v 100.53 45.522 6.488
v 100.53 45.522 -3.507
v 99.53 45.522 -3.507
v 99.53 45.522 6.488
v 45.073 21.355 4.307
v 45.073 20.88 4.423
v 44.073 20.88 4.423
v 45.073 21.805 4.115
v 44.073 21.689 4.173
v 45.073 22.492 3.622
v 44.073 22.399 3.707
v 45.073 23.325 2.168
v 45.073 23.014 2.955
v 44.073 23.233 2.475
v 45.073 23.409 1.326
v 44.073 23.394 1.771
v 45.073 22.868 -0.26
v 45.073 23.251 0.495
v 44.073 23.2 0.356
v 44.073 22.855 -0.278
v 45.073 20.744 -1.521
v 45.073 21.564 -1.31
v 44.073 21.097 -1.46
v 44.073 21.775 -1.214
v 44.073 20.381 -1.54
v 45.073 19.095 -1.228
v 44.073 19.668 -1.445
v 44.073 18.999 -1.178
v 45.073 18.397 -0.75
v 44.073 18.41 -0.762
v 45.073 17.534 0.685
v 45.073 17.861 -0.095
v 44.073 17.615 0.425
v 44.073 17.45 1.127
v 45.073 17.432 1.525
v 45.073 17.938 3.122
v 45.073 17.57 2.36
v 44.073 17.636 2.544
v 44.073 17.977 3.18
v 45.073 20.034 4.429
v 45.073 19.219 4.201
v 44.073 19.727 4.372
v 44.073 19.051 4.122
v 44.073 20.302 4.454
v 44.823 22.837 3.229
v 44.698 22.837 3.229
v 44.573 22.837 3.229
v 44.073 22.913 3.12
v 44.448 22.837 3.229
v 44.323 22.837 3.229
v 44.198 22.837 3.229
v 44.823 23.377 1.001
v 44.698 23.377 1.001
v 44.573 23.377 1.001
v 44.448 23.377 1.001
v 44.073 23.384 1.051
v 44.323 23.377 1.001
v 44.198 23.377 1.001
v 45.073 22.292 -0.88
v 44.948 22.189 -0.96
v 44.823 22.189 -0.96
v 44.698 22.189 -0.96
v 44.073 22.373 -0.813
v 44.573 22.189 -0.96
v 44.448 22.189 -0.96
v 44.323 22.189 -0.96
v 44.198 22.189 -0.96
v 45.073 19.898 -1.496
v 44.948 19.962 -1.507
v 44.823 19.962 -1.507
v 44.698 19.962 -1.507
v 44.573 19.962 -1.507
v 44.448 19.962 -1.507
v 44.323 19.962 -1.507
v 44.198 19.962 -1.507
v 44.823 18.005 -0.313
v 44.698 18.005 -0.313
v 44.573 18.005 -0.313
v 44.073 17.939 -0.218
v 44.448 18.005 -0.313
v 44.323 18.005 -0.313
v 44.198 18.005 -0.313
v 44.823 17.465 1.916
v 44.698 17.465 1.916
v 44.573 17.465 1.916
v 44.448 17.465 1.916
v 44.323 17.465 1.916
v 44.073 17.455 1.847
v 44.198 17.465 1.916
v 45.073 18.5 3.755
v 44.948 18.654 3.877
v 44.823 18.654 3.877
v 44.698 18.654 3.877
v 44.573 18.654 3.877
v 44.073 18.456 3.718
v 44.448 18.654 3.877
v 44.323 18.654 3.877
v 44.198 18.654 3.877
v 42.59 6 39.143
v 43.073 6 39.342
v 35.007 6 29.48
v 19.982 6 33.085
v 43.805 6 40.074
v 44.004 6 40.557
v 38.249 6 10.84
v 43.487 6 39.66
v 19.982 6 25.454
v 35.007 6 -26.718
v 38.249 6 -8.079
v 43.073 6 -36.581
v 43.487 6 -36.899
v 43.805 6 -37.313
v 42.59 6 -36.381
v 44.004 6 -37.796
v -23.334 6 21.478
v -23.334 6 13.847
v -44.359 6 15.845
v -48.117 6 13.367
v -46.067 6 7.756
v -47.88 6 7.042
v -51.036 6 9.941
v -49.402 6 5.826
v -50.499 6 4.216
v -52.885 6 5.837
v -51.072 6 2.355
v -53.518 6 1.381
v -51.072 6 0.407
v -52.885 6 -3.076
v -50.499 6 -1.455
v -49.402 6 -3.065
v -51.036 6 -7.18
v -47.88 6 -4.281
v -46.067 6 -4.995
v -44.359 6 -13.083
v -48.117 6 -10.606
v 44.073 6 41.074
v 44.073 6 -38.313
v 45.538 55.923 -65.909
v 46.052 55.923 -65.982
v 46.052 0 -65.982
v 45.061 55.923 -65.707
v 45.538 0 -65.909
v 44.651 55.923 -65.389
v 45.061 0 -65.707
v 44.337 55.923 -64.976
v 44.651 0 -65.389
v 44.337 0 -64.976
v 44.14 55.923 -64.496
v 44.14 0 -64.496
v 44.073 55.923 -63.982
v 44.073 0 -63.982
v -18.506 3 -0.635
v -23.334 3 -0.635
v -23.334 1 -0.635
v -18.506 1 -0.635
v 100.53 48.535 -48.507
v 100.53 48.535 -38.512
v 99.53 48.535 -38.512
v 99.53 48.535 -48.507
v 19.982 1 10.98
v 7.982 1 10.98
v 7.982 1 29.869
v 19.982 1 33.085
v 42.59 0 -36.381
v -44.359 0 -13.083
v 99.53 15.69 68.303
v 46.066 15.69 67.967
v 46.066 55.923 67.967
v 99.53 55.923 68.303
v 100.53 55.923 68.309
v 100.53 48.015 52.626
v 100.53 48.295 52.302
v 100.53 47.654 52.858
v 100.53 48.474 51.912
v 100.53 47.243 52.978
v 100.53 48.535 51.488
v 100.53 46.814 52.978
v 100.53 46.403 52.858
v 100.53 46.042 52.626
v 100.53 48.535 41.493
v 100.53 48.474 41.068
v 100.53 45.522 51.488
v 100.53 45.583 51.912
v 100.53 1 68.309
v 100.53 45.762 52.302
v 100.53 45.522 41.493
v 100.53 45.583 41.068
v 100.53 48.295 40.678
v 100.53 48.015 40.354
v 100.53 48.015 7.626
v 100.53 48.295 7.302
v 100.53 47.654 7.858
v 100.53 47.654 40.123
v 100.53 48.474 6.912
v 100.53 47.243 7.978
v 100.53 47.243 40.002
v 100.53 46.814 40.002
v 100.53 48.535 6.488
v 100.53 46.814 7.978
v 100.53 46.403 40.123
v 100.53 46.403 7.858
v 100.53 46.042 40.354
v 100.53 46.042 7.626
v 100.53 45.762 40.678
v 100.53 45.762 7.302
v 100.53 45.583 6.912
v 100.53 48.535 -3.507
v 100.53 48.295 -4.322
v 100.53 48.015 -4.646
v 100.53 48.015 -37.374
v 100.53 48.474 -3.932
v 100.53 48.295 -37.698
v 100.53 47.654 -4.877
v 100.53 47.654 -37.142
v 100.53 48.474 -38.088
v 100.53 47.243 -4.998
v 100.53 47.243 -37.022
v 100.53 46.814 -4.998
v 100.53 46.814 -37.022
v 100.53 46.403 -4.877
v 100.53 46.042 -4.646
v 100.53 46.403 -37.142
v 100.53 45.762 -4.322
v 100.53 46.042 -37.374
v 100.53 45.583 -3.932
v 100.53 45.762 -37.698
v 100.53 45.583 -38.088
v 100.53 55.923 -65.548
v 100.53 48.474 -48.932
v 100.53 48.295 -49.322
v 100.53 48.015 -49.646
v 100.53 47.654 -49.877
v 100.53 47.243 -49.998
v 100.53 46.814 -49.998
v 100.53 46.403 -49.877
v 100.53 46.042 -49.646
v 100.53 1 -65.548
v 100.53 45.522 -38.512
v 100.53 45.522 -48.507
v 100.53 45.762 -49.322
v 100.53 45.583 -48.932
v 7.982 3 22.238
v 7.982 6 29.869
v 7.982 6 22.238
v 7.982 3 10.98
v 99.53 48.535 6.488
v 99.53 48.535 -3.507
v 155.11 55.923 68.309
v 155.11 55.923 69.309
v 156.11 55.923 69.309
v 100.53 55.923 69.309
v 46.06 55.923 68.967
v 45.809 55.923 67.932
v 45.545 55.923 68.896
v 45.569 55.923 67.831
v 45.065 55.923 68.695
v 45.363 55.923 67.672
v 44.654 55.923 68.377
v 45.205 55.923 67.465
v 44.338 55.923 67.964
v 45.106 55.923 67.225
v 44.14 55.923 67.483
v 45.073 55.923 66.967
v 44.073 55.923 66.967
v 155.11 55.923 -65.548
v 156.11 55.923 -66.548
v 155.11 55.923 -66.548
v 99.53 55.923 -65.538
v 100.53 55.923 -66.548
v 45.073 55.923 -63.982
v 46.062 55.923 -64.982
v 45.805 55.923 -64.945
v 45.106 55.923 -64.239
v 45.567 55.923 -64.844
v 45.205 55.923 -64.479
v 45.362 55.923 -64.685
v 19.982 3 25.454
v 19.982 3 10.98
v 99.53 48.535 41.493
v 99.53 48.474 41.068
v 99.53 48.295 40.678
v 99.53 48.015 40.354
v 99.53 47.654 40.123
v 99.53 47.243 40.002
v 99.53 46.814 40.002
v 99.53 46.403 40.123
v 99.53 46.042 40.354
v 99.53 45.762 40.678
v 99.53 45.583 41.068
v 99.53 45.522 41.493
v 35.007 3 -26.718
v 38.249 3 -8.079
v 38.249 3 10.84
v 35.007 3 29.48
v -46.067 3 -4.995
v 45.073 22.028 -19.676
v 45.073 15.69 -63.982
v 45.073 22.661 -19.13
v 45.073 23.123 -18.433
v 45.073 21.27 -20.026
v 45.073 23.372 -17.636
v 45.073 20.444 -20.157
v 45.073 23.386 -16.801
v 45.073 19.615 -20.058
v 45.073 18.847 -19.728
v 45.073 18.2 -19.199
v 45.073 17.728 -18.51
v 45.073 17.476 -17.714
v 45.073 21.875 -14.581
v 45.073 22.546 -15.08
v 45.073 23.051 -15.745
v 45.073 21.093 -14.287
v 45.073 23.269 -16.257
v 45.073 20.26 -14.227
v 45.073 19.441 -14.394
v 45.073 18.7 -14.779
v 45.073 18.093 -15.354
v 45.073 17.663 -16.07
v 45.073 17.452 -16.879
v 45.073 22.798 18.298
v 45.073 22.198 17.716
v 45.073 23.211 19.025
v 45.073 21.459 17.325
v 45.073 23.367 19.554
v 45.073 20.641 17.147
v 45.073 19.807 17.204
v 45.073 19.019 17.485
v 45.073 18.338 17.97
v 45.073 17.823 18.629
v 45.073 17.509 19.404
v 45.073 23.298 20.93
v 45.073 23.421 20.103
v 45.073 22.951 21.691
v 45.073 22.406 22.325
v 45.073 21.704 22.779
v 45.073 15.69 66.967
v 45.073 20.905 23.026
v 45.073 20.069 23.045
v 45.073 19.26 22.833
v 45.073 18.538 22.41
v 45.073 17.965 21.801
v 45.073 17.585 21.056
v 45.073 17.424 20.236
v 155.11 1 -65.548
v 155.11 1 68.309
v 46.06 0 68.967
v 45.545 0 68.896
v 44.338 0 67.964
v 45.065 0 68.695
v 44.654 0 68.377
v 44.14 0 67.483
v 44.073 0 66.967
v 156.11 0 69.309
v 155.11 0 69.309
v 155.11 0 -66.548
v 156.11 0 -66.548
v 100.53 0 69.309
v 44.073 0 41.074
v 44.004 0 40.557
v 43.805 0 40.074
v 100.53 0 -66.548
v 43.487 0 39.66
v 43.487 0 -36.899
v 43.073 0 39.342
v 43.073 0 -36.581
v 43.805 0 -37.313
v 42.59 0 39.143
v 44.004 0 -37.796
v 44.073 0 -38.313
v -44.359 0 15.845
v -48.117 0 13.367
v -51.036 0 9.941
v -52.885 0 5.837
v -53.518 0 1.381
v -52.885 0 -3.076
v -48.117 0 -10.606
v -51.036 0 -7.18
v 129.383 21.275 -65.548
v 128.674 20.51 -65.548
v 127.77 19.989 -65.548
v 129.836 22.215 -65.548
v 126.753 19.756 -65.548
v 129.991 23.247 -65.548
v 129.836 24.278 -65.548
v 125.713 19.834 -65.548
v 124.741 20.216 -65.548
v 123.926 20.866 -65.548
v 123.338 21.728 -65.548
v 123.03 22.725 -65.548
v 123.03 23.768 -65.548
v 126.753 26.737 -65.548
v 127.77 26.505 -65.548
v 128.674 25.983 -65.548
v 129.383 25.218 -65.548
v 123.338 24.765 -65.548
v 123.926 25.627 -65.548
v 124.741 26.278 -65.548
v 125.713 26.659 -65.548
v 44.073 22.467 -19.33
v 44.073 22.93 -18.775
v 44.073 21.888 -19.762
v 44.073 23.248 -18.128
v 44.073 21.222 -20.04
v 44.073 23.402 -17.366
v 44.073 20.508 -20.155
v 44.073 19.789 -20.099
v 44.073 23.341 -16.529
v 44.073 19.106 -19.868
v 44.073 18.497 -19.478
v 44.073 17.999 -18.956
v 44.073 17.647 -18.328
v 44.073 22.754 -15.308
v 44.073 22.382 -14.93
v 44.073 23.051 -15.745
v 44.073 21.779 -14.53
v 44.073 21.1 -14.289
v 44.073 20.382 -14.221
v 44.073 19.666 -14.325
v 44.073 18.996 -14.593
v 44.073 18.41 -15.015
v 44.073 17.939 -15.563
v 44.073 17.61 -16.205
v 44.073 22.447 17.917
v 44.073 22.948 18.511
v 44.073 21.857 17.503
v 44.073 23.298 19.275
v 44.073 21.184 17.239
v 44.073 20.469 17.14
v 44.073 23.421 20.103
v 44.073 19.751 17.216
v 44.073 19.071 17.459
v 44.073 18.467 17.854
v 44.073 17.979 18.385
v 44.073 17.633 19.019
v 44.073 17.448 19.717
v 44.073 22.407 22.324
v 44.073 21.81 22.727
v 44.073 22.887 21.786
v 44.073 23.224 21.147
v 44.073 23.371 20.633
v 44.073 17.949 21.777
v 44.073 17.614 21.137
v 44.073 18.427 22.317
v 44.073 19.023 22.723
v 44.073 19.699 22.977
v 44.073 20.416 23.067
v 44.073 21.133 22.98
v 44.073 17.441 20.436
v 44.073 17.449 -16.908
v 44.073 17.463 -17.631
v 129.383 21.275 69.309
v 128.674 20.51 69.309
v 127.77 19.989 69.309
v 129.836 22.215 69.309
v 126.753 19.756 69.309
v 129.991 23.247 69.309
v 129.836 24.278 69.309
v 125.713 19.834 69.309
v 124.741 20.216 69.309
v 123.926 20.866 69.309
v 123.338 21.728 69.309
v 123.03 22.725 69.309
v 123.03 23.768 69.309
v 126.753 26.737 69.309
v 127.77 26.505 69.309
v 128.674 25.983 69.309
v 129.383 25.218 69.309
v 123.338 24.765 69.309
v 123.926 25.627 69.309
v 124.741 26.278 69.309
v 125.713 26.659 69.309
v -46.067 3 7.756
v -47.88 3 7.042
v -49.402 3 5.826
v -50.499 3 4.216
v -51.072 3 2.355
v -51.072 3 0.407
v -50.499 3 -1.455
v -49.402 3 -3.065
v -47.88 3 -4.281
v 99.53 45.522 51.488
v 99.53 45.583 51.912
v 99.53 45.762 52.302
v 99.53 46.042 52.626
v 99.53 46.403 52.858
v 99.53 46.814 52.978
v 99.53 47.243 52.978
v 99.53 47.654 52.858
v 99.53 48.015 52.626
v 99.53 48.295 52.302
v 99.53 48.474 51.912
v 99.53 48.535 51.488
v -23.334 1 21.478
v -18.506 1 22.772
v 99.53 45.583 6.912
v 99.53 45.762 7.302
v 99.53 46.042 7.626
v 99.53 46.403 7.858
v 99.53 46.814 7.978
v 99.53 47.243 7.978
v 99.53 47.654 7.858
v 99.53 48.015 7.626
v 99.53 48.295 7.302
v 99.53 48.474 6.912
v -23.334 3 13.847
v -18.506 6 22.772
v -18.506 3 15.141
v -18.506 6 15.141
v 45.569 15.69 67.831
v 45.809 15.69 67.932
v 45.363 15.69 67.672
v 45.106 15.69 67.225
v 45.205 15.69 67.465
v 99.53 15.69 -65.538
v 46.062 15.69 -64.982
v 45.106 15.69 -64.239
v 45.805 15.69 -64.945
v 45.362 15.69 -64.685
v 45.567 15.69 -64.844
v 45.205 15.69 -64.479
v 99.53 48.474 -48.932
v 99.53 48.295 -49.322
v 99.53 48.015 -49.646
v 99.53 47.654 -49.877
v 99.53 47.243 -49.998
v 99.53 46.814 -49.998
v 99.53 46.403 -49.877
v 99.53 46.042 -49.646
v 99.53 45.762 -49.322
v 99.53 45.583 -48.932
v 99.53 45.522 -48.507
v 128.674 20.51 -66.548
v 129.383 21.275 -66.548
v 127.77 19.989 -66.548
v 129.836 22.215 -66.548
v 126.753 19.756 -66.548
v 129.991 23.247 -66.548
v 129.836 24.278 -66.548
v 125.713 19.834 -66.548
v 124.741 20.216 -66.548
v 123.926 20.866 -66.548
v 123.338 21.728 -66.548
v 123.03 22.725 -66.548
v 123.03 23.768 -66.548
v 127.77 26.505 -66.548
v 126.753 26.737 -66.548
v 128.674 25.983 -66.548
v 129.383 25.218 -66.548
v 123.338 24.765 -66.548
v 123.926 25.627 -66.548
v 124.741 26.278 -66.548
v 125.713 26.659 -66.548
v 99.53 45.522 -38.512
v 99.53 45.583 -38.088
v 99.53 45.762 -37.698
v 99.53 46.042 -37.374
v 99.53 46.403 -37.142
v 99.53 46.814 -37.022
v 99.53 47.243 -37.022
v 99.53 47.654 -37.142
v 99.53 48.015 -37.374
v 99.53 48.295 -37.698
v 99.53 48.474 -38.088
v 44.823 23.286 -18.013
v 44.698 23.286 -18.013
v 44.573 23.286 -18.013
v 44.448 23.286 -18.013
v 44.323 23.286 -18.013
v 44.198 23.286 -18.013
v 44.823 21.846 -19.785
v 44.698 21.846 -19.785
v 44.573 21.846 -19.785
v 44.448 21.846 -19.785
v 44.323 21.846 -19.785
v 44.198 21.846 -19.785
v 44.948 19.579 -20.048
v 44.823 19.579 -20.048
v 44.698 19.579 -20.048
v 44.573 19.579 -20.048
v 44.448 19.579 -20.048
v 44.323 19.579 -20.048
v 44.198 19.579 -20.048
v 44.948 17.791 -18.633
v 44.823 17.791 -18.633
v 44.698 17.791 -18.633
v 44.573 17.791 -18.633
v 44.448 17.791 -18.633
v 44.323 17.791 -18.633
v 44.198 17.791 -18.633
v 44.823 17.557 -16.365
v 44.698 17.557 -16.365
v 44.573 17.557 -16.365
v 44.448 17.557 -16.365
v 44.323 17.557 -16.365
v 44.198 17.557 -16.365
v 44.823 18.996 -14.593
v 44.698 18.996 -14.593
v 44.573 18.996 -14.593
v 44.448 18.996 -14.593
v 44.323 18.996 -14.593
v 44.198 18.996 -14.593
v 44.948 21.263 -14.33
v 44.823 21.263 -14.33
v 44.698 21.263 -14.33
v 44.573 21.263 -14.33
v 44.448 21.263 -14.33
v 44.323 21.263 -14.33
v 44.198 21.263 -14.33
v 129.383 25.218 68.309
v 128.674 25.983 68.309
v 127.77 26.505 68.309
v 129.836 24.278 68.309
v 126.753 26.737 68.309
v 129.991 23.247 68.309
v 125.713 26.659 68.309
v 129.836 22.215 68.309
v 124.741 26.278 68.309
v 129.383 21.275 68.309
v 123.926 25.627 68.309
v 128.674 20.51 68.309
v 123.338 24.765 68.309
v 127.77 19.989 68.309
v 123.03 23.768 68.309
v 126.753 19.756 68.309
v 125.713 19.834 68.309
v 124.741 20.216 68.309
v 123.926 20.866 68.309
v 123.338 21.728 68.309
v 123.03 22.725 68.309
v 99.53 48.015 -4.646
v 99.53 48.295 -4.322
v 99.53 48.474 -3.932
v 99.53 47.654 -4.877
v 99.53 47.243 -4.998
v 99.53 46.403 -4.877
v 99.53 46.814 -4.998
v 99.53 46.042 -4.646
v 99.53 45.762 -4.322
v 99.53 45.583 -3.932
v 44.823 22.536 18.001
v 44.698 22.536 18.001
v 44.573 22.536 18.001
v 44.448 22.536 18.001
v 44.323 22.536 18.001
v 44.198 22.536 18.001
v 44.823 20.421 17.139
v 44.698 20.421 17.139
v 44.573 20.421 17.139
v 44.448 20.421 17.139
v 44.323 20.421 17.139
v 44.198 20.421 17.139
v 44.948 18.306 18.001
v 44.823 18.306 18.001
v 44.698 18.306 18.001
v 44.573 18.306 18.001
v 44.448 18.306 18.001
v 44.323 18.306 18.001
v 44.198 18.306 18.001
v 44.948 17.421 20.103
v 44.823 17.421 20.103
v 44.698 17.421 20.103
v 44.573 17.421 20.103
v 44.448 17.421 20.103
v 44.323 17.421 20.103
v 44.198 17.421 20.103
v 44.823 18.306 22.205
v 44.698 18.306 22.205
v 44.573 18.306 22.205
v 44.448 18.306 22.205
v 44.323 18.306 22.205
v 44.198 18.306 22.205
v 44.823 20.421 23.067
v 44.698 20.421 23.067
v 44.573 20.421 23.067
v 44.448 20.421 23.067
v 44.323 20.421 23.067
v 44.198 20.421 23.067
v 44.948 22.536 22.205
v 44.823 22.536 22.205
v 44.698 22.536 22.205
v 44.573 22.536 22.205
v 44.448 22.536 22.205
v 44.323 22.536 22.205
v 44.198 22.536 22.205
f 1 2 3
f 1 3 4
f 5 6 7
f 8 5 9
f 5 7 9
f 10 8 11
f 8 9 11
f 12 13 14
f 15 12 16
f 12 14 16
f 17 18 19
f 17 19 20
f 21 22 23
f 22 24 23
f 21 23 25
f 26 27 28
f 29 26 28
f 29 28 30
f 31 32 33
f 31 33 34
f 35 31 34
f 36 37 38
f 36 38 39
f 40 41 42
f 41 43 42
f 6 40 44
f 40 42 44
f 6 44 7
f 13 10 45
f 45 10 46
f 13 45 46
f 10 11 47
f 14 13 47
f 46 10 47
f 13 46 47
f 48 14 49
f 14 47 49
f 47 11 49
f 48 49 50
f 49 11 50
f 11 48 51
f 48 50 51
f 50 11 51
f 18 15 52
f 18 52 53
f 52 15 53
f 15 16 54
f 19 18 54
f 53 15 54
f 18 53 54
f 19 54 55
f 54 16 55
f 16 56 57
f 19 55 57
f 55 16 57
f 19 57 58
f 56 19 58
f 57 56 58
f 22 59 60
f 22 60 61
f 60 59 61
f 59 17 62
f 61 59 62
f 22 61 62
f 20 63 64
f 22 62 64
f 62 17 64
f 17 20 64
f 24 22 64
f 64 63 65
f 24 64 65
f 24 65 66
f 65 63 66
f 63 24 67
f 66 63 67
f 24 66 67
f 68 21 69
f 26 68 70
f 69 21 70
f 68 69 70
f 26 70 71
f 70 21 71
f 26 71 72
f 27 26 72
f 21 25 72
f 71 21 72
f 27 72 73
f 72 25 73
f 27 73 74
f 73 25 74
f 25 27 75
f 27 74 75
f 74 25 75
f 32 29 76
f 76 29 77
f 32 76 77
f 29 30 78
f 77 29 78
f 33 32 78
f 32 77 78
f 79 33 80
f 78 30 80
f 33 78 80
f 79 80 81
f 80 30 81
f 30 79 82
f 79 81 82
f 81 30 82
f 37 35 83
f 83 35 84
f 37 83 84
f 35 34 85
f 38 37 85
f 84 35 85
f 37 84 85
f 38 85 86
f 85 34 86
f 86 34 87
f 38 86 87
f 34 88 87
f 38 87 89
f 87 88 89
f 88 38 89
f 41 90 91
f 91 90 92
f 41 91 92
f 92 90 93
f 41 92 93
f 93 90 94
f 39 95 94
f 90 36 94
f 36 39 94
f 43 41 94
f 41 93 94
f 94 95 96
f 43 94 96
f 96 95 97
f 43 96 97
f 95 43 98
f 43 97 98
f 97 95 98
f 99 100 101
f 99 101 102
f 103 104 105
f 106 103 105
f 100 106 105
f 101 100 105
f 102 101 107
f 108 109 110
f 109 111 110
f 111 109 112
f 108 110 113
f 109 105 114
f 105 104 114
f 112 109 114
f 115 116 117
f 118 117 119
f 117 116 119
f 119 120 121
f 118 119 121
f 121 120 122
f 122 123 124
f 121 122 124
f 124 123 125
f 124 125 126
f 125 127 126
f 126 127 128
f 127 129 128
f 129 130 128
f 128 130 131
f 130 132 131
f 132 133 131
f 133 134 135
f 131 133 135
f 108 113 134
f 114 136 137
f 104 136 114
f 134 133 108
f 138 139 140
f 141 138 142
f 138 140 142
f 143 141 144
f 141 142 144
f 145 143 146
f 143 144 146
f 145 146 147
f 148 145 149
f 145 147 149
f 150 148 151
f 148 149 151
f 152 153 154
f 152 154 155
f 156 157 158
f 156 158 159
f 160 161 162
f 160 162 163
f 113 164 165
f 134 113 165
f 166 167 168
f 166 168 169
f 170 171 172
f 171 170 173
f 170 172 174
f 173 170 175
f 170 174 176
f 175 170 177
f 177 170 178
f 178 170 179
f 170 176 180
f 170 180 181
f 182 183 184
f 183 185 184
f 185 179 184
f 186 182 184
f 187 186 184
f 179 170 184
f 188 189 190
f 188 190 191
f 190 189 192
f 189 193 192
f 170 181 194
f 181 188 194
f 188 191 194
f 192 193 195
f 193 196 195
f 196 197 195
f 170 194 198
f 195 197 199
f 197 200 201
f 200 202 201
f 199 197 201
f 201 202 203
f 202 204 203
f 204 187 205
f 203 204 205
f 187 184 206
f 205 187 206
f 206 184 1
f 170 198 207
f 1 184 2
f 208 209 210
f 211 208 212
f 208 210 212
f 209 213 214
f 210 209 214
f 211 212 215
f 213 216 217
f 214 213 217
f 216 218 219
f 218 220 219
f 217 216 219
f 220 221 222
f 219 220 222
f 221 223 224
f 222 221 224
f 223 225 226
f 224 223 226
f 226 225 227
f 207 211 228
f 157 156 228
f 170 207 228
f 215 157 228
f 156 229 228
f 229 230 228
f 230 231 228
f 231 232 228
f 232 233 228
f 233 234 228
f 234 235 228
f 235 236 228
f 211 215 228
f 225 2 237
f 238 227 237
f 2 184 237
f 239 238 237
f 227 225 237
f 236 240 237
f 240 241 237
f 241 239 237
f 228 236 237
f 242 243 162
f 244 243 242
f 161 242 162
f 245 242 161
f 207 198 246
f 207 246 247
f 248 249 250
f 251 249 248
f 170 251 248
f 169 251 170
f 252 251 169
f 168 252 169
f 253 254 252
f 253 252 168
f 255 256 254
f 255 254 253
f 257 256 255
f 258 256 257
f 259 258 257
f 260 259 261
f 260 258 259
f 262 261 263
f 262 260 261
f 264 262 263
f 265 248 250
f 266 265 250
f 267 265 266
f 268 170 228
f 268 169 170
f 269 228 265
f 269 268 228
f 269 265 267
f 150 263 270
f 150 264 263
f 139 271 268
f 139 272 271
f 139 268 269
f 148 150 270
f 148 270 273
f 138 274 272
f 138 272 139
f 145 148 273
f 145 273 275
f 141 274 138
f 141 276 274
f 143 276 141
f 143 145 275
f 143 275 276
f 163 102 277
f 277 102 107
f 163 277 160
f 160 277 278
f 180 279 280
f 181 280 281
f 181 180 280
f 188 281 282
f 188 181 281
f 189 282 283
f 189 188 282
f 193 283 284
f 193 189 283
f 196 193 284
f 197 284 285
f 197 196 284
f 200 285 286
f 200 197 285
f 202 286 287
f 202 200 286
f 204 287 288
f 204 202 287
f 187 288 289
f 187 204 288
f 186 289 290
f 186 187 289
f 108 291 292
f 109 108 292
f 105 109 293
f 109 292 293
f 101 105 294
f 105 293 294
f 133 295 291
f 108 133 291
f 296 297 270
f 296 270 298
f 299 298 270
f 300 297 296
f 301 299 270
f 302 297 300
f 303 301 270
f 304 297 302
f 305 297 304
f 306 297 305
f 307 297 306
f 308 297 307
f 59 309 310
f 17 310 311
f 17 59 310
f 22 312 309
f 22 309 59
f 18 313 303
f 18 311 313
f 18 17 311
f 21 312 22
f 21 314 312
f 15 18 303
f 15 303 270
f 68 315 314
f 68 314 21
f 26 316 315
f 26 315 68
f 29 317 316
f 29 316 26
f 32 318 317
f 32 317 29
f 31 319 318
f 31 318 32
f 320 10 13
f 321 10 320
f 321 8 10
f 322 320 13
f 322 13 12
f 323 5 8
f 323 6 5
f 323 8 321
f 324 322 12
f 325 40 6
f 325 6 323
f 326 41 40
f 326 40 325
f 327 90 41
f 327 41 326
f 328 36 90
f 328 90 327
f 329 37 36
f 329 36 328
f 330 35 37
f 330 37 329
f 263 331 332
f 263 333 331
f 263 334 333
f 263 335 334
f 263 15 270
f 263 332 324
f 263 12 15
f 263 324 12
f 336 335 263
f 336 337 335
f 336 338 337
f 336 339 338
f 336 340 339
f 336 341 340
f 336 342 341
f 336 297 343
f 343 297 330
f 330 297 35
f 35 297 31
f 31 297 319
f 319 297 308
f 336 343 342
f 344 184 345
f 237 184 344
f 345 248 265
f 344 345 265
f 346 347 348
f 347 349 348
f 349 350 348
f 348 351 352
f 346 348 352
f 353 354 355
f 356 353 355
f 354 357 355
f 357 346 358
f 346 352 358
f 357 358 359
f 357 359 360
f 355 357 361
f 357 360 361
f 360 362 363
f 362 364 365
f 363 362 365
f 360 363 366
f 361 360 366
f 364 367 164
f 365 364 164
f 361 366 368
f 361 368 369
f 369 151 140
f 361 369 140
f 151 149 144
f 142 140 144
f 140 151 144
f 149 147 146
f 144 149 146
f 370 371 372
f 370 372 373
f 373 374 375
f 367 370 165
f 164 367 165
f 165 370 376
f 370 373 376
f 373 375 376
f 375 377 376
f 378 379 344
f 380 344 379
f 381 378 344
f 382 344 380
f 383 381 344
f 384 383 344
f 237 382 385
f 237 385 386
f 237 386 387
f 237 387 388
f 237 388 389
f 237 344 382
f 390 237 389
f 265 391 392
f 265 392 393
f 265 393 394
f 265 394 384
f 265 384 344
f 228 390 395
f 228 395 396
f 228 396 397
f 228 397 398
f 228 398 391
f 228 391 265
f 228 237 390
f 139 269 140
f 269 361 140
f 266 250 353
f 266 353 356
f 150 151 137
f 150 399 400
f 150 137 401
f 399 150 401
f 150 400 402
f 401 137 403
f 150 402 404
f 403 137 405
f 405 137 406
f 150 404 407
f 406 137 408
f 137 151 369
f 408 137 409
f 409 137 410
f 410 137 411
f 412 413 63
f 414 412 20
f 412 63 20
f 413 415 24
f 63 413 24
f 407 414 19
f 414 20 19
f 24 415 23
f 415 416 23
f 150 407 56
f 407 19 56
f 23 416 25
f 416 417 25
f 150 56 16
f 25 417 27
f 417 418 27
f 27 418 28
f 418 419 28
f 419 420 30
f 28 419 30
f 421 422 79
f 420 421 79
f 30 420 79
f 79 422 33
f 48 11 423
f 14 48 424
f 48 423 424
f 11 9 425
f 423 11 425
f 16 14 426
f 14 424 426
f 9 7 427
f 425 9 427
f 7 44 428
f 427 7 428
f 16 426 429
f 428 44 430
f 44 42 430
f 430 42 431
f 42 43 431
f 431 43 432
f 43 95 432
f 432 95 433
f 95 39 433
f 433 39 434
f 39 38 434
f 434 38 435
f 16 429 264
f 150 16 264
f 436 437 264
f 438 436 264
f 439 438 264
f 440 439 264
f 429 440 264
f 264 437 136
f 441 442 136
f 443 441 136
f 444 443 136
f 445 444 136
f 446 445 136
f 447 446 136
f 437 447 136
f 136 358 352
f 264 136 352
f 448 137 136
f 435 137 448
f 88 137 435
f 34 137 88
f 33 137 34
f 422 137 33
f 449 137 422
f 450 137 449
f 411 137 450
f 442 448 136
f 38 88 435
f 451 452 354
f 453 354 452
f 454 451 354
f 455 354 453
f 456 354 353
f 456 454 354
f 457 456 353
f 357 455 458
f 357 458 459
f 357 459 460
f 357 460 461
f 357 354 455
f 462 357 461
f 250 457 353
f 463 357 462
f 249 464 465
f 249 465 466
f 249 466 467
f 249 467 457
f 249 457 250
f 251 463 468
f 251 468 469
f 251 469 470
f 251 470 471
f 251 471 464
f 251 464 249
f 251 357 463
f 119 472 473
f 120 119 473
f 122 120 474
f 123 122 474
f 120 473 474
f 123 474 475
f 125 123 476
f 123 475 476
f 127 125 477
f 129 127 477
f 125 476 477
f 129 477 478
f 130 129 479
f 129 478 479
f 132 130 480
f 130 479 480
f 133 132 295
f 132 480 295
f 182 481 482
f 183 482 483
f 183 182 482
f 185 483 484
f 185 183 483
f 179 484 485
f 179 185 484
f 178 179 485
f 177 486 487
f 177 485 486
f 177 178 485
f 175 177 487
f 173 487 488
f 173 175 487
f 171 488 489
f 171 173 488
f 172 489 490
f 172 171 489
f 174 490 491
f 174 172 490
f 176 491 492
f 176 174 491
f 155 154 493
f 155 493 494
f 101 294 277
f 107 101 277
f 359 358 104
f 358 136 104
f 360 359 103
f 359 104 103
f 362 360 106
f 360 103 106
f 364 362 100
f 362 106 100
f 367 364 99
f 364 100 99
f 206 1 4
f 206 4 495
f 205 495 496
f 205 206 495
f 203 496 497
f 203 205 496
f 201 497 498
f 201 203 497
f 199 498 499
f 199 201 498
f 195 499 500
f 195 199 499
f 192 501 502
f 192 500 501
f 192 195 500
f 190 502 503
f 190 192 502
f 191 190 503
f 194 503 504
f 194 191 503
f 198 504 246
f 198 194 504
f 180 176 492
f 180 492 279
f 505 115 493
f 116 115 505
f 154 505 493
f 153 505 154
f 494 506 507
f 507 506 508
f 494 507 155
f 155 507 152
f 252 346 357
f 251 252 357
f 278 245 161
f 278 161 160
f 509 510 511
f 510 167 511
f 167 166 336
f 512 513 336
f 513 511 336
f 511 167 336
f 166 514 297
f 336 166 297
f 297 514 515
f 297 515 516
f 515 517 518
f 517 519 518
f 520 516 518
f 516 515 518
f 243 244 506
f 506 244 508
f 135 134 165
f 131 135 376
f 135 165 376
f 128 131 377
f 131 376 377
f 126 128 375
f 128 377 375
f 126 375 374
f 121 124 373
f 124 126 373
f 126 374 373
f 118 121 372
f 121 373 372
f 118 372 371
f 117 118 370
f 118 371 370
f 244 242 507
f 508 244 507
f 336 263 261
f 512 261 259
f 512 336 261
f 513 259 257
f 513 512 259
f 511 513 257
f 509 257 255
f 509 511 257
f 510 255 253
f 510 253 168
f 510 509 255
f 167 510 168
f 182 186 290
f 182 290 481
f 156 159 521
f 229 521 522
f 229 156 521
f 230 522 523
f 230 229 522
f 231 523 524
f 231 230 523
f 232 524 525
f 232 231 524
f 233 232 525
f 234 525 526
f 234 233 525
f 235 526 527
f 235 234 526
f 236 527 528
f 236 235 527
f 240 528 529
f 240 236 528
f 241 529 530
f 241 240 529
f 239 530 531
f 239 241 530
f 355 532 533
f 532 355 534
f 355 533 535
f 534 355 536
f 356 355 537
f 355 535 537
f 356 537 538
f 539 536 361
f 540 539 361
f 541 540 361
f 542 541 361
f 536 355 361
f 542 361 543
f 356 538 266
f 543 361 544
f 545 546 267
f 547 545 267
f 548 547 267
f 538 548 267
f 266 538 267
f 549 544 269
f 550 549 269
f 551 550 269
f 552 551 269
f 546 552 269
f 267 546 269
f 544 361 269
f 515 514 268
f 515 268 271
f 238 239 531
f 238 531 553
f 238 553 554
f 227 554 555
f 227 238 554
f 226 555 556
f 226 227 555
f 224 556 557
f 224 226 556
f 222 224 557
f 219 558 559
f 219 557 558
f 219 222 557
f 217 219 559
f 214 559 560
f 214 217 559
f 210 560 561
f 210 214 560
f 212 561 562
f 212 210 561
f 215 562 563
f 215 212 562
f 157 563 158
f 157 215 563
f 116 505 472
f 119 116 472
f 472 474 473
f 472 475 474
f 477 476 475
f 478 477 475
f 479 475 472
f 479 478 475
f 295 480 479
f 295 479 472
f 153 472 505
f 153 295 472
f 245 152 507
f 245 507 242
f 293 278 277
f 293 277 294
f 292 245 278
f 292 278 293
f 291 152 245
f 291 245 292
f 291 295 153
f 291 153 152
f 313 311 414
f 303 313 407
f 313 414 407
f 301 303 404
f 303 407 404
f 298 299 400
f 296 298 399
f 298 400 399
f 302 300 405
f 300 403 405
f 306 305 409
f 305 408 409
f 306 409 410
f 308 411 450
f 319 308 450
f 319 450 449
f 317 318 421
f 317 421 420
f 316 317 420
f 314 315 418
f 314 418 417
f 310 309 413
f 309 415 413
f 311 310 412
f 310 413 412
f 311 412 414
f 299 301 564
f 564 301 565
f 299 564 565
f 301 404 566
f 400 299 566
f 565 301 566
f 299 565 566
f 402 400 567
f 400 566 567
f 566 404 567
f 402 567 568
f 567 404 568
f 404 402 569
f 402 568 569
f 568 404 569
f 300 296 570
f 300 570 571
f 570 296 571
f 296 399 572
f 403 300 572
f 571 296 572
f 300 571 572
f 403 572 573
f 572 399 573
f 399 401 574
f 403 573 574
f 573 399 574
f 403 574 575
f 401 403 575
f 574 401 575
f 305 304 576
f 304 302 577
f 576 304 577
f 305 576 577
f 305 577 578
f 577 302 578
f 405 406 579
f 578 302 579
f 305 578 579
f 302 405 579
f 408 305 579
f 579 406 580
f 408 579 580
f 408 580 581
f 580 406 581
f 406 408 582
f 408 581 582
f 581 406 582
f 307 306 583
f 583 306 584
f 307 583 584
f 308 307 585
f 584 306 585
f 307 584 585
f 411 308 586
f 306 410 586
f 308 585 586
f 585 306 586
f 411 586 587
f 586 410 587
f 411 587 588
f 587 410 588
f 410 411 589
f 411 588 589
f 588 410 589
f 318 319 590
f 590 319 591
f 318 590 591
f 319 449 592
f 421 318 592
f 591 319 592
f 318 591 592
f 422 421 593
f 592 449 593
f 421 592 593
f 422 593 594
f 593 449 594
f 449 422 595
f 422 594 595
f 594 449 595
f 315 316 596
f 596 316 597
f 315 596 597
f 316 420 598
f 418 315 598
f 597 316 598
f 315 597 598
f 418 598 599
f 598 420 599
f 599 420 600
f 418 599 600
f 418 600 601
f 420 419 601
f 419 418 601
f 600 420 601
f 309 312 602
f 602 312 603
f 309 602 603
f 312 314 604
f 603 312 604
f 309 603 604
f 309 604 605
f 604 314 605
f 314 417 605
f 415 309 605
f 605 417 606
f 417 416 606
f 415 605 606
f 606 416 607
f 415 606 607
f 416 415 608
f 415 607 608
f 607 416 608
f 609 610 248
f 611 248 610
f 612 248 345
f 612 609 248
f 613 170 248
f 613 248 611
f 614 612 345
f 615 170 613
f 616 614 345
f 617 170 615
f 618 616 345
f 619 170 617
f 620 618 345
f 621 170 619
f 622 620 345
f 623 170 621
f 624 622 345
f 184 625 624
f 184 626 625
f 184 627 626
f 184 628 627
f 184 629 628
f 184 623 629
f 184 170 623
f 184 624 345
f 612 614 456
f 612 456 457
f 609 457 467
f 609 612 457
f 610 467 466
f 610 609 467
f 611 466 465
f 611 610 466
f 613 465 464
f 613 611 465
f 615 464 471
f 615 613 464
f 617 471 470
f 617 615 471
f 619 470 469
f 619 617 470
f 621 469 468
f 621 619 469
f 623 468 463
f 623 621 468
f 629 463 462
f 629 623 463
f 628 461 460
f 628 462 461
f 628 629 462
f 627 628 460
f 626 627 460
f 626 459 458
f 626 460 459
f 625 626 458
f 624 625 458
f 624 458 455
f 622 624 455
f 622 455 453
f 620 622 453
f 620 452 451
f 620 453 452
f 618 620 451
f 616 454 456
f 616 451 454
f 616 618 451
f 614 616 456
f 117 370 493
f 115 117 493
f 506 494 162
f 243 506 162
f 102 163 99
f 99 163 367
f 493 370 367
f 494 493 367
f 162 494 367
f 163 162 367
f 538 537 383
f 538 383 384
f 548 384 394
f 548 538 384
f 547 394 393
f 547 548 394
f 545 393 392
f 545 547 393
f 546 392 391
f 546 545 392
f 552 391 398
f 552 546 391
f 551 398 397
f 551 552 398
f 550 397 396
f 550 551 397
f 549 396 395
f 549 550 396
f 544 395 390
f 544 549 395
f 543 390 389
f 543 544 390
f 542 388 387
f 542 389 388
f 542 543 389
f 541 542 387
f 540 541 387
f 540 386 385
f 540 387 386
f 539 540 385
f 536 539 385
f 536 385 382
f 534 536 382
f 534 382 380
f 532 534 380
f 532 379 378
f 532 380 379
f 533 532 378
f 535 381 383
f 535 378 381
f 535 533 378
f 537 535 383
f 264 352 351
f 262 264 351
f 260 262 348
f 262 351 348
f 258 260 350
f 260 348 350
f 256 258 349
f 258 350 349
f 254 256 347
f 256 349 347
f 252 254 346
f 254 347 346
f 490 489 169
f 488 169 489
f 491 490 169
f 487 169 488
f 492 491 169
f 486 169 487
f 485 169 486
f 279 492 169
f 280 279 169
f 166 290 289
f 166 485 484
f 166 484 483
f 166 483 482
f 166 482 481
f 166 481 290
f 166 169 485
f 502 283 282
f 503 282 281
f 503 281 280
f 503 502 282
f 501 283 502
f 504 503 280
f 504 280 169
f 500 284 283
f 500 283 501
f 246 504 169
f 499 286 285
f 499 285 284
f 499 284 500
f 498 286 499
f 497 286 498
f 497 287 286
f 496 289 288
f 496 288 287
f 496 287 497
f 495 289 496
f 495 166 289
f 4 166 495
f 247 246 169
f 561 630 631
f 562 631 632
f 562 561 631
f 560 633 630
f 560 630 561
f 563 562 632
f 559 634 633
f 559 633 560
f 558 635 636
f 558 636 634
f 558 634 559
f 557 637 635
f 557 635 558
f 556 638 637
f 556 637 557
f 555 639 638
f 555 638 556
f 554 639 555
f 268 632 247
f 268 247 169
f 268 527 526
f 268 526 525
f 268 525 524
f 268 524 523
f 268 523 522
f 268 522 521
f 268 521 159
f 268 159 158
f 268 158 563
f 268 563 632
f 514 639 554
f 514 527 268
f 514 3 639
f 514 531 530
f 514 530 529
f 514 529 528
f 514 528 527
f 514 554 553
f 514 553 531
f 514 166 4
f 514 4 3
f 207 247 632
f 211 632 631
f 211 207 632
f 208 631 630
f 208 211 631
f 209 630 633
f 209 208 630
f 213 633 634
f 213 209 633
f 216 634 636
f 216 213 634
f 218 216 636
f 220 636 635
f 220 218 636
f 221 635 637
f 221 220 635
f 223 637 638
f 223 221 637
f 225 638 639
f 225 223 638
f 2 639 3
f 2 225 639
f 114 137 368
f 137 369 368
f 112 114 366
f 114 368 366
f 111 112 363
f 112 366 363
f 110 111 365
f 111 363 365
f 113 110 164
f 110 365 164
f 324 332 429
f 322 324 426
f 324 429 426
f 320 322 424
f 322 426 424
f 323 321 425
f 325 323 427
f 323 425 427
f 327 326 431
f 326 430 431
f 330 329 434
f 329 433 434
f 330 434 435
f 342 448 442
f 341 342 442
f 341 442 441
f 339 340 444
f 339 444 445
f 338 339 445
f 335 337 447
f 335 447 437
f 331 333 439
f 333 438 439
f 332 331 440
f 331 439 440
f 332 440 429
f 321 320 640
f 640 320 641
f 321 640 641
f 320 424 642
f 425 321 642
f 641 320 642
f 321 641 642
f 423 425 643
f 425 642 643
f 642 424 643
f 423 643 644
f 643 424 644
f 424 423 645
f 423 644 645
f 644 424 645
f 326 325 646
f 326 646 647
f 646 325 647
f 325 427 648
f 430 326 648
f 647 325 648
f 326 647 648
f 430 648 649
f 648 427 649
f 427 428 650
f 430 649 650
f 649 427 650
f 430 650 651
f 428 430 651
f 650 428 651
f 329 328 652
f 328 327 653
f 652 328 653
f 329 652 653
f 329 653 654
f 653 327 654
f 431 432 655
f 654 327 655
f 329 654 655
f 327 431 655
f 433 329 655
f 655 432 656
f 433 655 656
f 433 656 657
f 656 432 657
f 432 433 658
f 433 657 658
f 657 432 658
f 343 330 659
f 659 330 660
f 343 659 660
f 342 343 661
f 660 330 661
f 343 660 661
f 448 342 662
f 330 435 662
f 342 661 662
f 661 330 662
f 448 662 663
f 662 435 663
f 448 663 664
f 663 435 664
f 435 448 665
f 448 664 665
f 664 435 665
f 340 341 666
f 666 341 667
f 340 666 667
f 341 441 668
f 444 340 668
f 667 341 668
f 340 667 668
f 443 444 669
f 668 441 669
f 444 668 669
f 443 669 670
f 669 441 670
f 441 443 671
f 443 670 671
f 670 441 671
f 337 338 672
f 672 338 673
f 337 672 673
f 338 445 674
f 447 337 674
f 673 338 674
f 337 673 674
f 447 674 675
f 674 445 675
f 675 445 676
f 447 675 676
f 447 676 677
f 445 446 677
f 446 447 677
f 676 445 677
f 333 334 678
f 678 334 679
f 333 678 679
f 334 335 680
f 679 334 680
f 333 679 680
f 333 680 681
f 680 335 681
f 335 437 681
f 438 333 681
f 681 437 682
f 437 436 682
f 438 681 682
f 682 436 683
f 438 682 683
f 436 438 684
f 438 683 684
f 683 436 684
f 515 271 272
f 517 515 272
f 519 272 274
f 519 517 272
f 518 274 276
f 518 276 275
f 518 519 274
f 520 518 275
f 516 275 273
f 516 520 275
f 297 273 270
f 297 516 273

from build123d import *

# Parameters (mm, degrees)
BOSS_EXTRUDE1_DEPTH      = 3
BOSS_EXTRUDE2_DEPTH      = 6
BOSS_EXTRUDE3_DEPTH      = 9.69
BOSS_EXTRUDE3_DEPTH_BACK = 6
FILLET1_R                = 2
FILLET2_R                = 2
BOSS_EXTRUDE4_DEPTH      = 40.233333333
CUT_EXTRUDE1_DEPTH       = 1.5
CUT_EXTRUDE2_DEPTH       = 1.5
BOSS_EXTRUDE5_DEPTH      = 54.58
CUT_EXTRUDE3_DEPTH       = 214.009386465
CUT_EXTRUDE3_DEPTH_BACK  = 214.009386465
SKETCH10_R               = 3.5
SKETCH12_W               = 12
SKETCH12_H               = 30.726270376
SKETCH12_W_2             = 4.828508562
SKETCH12_H_2             = 30.231621193
CUT_EXTRUDE4_DEPTH       = 5
SKETCH13_W               = 135.857143104
SKETCH13_H               = 55.923333333
BOSS_EXTRUDE6_DEPTH      = 1


with BuildPart() as part:
    # Sketch2 → Boss-Extrude1 (new body)
    with BuildSketch(Plane(origin=(0, 0, 0), x_dir=(1, 0, 0), z_dir=(0, 1, 0))):
        with BuildLine():
            Line((-44.358814779, -15.844661539), (100.530059165, -54.667518304))
            Line((100.530059165, -54.667518304), (100.530059165, 51.906312945))
            Line((100.530059165, 51.906312945), (-44.358814779, 13.083456179))
            ThreePointArc((-44.358814779, 13.083456179), (-53.518419956, -1.38060268), (-44.358814779, -15.844661539))
        make_face()
    extrude(amount=BOSS_EXTRUDE1_DEPTH)

    # Sketch2<3> → Boss-Extrude2 (add)
    with BuildSketch(Plane(origin=(0, 0, 0), x_dir=(1, 0, 0), z_dir=(0, 1, 0))):
        with BuildLine():
            Line((-44.358814779, 13.083456179), (100.530059165, 51.906312945))
            Line((100.530059165, 51.906312945), (100.530059165, -54.667518304))
            Line((100.530059165, -54.667518304), (-44.358814779, -15.844661539))
            ThreePointArc((-44.358814779, -15.844661539), (-53.518419956, -1.38060268), (-44.358814779, 13.083456179))
        make_face()
        with BuildLine():
            Line((-46.067020476, 4.994507774), (35.007341865, 26.71831769))
            ThreePointArc((35.007341865, 26.71831769), (38.656739262, -1.38060268), (35.007341865, -29.479523049))
            Line((35.007341865, -29.479523049), (-46.067020476, -7.755713133))
            ThreePointArc((-46.067020476, -7.755713133), (-51.145215007, -1.38060268), (-46.067020476, 4.994507774))
        make_face(mode=Mode.SUBTRACT)
    extrude(amount=BOSS_EXTRUDE2_DEPTH)

    # Sketch3 → Boss-Extrude3 (add, two sides: drawn at the far end of the back side and taken through both)
    with BuildSketch(Plane(origin=(0, 6, 0), x_dir=(1, 0, 0), z_dir=(0, 1, 0)).offset(-BOSS_EXTRUDE3_DEPTH_BACK)):
        with BuildLine():
            Line((44.072517202, -66.967163029), (44.072517202, -39.539765529))
            Line((44.072517202, -39.539765529), (44.072517202, 36.778560169))
            Line((44.072517202, 36.778560169), (44.072517202, 63.981792798))
            ThreePointArc((44.072517202, 63.981792798), (44.650972897, 65.388637419), (46.051728991, 65.981684758))
            Line((46.051728991, 65.981684758), (100.530059165, 66.547968872))
            Line((100.530059165, 66.547968872), (100.530059165, 51.906312945))
            Line((100.530059165, 51.906312945), (100.530059165, -54.667518304))
            Line((100.530059165, -54.667518304), (100.530059165, -69.309174232))
            Line((100.530059165, -69.309174232), (46.059958243, -68.967123596))
            ThreePointArc((46.059958243, -68.967123596), (44.653870326, -68.376929336), (44.072517202, -66.967163029))
        make_face()
    extrude(amount=BOSS_EXTRUDE3_DEPTH + BOSS_EXTRUDE3_DEPTH_BACK)

    # Fillet1
    fillet1_edges = [part.edges().sort_by_distance(p)[0] for p in [
        (44.072517202, 3, 39.539765529),
    ]]
    fillet(fillet1_edges, radius=FILLET1_R)

    # Fillet2
    fillet2_edges = [part.edges().sort_by_distance(p)[0] for p in [
        (44.072517202, 3, -36.778560169),
    ]]
    fillet(fillet2_edges, radius=FILLET2_R)

    # Sketch5 → Boss-Extrude4 (add)
    with BuildSketch(Plane(origin=(0, 15.69, 0), x_dir=(1, 0, 0), z_dir=(0, 1, 0))):
        with BuildLine():
            Line((46.059958243, -68.967123596), (100.530059165, -69.309174232))
            Line((100.530059165, -69.309174232), (100.530059165, 66.547968872))
            Line((100.530059165, 66.547968872), (46.051728991, 65.981684758))
            ThreePointArc((46.051728991, 65.981684758), (44.650972897, 65.388637419), (44.072517202, 63.981792798))
            Line((44.072517202, 63.981792798), (44.072517202, -66.967163029))
            ThreePointArc((44.072517202, -66.967163029), (44.653870326, -68.376929336), (46.059958243, -68.967123596))
        make_face()
        with BuildLine():
            Line((99.530059165, -68.302874912), (99.530059165, 65.537520182))
            Line((99.530059165, 65.537520182), (46.062123097, 64.981738778))
            ThreePointArc((46.062123097, 64.981738778), (45.36174505, 64.685215109), (45.072517202, 63.981792798))
            Line((45.072517202, 63.981792798), (45.072517202, -66.967163029))
            ThreePointArc((45.072517202, -66.967163029), (45.363193764, -67.672046182), (46.066237723, -67.967143312))
            Line((46.066237723, -67.967143312), (99.530059165, -68.302874912))
        make_face(mode=Mode.SUBTRACT)
    extrude(amount=BOSS_EXTRUDE4_DEPTH)

    # Sketch6 → Cut-Extrude1 (cut)
    with BuildSketch(Plane.ZY.offset(-44.072517202)):
        with BuildLine():
            add(Edge.make_bspline(
                [(-15.745078449, 23.050825441), (-16.426574269, 23.424993836), (-18.107694271, 23.59390395), (-20.06054673, 21.997763181), (-20.359072413, 19.493331011), (-18.791777494, 17.501685815), (-16.270097491, 17.248320643), (-14.317245033, 18.844461412), (-14.018719349, 21.348893583), (-15.063582628, 22.676657046), (-15.745078449, 23.050825441)],
                knots=[0, 0, 0, 0, 0.785398163, 1.570796327, 2.35619449, 3.141592654, 3.926990817, 4.71238898, 5.497787144, 6.283185307, 6.283185307, 6.283185307, 6.283185307], degree=3))
        make_face()
        with BuildLine():
            add(Edge.make_bspline(
                [(4.422895342, 20.879911755), (4.30327296, 21.652897904), (3.419826029, 23.099177602), (0.951461151, 23.695508582), (-1.221188854, 22.380963882), (-1.828624955, 19.912466539), (-0.50345456, 17.743046992), (1.964910319, 17.146716012), (4.137560324, 18.461260712), (4.542517725, 20.106925607), (4.422895342, 20.879911755)],
                knots=[0, 0, 0, 0, 0.785398163, 1.570796327, 2.35619449, 3.141592654, 3.926990817, 4.71238898, 5.497787144, 6.283185307, 6.283185307, 6.283185307, 6.283185307], degree=3))
        make_face()
        with BuildLine():
            add(Edge.make_bspline(
                [(20.102815045, 23.421112297), (19.325002738, 23.421112297), (17.769378124, 22.760793636), (16.823992487, 20.421112297), (17.769378124, 18.081430957), (20.102815045, 17.090952967), (22.436251966, 18.081430957), (23.381637603, 20.421112297), (22.436251966, 22.760793636), (20.880627352, 23.421112297), (20.102815045, 23.421112297)],
                knots=[0, 0, 0, 0, 0.785398163, 1.570796327, 2.35619449, 3.141592654, 3.926990817, 4.71238898, 5.497787144, 6.283185307, 6.283185307, 6.283185307, 6.283185307], degree=3))
        make_face()
    extrude(amount=-CUT_EXTRUDE1_DEPTH, mode=Mode.SUBTRACT)

    # Sketch7 → Cut-Extrude2 (cut)
    with BuildSketch(Plane(origin=(100.530059165, 0, 0), x_dir=(0, 0, -1), z_dir=(1, 0, 0))):
        with BuildLine():
            Line((-51.487685115, 48.534557921), (-41.492685115, 48.534557921))
            ThreePointArc((-41.492685115, 48.534557921), (-39.98663504, 47.028507846), (-41.492685115, 45.522457772))
            Line((-41.492685115, 45.522457772), (-51.487685115, 45.522457772))
            ThreePointArc((-51.487685115, 45.522457772), (-52.99373519, 47.028507846), (-51.487685115, 48.534557921))
        make_face()
        with BuildLine():
            Line((-6.487685115, 48.534557921), (3.507314885, 48.534557921))
            ThreePointArc((3.507314885, 48.534557921), (5.013364959, 47.028507846), (3.507314885, 45.522457772))
            Line((3.507314885, 45.522457772), (-6.487685115, 45.522457772))
            ThreePointArc((-6.487685115, 45.522457772), (-7.99373519, 47.028507846), (-6.487685115, 48.534557921))
        make_face()
        with BuildLine():
            Line((38.512314885, 48.534557921), (48.507314885, 48.534557921))
            ThreePointArc((48.507314885, 48.534557921), (50.01336496, 47.028507846), (48.507314885, 45.522457772))
            Line((48.507314885, 45.522457772), (38.512314885, 45.522457772))
            ThreePointArc((38.512314885, 45.522457772), (37.00626481, 47.028507846), (38.512314885, 48.534557921))
        make_face()
    extrude(amount=-CUT_EXTRUDE2_DEPTH, mode=Mode.SUBTRACT)

    # Sketch8 → Boss-Extrude5 (add)
    with BuildSketch(Plane(origin=(100.530059165, 0, 0), x_dir=(0, 0, -1), z_dir=(1, 0, 0))):
        Polygon((66.547968872, 55.923333333), (66.547968872, 0), (-69.309174232, 0), (-69.309174232, 55.923333333), (-68.309174232, 55.923333333), (-68.309174232, 1), (65.547968872, 1), (65.547968872, 55.923333333), align=None)
    extrude(amount=BOSS_EXTRUDE5_DEPTH)

    # Sketch10 → Cut-Extrude3 (cut, two sides: drawn at the far end of the back side and taken through both)
    with BuildSketch(Plane.XY.offset(-65.547968872).offset(-CUT_EXTRUDE3_DEPTH_BACK)):
        with Locations((126.491326957, 23.246690768)):
            Circle(SKETCH10_R)
    extrude(amount=CUT_EXTRUDE3_DEPTH + CUT_EXTRUDE3_DEPTH_BACK, mode=Mode.SUBTRACT)

    # Sketch12 → Cut-Extrude4 (cut)
    with BuildSketch(Plane(origin=(0, 6, 0), x_dir=(1, 0, 0), z_dir=(0, 1, 0))):
        with Locations((13.982227259, -26.342654968)):
            Rectangle(SKETCH12_W, SKETCH12_H)
        with Locations((-20.920113411, -14.480437774)):
            Rectangle(SKETCH12_W_2, SKETCH12_H_2)
    extrude(amount=-CUT_EXTRUDE4_DEPTH, mode=Mode.SUBTRACT)

    # Sketch13 → Boss-Extrude6 (add)
    with BuildSketch(Plane(origin=(155.110059165, 0, 0), x_dir=(0, 0, -1), z_dir=(1, 0, 0))):
        with Locations((-1.38060268, 27.961666667)):
            Rectangle(SKETCH13_W, SKETCH13_H)
    extrude(amount=BOSS_EXTRUDE6_DEPTH)


solid = part.part
